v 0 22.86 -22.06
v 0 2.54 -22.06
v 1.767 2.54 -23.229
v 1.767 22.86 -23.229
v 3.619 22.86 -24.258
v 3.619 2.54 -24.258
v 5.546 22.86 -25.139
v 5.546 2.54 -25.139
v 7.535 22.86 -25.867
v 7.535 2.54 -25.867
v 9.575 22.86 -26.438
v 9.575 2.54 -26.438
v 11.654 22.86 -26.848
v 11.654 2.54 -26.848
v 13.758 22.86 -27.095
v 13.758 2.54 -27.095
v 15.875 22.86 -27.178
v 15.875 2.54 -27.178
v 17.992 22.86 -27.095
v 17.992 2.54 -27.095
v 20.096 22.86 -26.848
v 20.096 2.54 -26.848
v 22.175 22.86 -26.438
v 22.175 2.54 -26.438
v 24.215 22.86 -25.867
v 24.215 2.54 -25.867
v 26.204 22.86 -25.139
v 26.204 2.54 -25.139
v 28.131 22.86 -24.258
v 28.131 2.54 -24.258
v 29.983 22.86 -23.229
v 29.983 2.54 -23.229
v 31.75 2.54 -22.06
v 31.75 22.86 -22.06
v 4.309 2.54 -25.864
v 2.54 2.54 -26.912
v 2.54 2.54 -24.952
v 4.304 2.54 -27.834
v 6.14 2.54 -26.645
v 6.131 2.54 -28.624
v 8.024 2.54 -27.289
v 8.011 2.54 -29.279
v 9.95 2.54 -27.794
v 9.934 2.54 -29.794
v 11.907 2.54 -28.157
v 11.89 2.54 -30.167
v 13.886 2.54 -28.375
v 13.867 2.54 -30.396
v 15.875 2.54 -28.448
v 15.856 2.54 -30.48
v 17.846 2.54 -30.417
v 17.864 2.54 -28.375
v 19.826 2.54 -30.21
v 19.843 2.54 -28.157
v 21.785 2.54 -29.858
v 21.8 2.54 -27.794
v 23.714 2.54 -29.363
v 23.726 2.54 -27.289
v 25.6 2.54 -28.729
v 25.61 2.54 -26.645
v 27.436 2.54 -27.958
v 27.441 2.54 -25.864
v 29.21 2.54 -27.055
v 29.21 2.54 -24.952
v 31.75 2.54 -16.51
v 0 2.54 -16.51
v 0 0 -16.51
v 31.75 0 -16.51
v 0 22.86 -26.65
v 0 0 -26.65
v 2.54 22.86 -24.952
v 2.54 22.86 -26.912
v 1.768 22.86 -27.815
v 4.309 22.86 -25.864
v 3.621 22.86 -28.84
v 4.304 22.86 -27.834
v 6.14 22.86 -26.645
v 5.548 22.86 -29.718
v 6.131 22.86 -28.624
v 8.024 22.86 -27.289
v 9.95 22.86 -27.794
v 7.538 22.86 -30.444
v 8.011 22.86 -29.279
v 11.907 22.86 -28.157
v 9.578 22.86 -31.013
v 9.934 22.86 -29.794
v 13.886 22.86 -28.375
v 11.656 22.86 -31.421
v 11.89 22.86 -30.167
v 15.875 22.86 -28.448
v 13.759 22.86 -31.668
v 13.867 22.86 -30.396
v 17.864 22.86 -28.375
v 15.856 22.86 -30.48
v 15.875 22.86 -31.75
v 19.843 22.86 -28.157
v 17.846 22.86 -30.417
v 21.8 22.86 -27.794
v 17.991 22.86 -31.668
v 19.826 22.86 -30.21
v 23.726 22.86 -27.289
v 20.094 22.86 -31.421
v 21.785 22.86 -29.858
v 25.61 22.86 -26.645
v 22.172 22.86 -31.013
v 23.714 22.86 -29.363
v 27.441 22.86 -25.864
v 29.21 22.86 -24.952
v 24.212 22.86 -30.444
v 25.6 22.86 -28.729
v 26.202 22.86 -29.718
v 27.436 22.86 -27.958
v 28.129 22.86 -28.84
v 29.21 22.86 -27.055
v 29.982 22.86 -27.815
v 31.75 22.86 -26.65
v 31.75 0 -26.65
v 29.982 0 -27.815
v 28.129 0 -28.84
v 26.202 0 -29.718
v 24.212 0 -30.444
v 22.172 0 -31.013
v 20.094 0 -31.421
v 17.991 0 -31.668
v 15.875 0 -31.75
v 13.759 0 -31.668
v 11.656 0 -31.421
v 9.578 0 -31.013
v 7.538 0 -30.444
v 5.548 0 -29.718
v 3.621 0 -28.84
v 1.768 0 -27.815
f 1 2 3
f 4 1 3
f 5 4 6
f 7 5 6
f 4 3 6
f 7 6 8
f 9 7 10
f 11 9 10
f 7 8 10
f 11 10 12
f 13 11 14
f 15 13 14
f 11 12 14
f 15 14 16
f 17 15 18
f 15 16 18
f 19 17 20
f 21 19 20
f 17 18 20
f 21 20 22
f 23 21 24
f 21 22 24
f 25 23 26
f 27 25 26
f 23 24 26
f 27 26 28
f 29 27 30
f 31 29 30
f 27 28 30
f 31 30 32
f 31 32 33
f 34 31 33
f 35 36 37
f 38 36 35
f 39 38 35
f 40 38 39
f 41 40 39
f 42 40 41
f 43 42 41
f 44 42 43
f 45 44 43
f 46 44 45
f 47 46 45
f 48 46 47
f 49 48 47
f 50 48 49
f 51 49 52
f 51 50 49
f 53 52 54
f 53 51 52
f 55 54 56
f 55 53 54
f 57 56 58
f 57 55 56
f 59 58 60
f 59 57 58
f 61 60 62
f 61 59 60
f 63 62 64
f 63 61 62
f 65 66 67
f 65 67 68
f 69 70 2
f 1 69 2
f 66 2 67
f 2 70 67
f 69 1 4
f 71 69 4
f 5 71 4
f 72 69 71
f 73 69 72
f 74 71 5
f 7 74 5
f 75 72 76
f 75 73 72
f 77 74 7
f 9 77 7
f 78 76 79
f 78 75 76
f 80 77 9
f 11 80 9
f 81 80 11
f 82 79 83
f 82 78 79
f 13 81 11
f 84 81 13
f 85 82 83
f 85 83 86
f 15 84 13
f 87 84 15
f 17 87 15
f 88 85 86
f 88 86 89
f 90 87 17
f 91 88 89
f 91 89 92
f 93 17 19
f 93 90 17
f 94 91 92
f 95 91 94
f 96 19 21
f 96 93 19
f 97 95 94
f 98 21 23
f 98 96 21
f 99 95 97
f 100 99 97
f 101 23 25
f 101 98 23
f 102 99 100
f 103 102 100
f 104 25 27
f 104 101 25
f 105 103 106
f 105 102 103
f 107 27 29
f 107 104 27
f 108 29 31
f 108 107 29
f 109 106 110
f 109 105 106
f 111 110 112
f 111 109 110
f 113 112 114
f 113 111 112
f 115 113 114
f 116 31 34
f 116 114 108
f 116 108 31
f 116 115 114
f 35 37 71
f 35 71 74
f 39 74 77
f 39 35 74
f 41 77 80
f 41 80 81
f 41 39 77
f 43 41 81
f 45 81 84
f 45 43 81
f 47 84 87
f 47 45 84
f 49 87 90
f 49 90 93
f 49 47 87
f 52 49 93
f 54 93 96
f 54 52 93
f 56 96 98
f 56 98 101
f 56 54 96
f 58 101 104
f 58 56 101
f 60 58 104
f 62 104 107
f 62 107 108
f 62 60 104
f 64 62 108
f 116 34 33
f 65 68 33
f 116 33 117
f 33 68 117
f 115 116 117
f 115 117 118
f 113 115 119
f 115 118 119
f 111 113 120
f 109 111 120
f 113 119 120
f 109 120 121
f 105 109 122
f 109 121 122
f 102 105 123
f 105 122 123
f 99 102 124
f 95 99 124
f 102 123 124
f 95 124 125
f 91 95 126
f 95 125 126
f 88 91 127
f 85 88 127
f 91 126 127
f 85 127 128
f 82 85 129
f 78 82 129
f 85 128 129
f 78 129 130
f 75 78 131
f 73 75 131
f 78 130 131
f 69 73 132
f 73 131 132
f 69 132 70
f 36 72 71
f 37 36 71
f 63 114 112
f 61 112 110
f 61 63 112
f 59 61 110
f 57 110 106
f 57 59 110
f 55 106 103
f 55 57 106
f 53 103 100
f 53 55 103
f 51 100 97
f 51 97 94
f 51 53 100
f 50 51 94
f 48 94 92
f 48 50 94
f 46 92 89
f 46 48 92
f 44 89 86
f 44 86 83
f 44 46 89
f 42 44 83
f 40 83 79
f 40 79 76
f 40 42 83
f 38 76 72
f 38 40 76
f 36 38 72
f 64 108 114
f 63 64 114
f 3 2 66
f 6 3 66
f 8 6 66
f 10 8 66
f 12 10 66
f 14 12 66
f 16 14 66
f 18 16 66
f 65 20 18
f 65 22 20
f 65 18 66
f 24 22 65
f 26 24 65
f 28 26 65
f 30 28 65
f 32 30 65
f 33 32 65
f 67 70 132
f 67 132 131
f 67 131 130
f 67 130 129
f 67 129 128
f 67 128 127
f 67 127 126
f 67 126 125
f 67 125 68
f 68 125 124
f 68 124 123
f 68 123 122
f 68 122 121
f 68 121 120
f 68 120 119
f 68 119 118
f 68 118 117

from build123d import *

# Parameters (mm, degrees)
BOSS_EXTRUDE1_DEPTH = 2.54
BOSS_EXTRUDE4_DEPTH = 20.32
SKETCH3_W           = 31.75
SKETCH3_H           = 16.51
CUT_EXTRUDE1_DEPTH  = 2.54


with BuildPart() as part:
    # Sketch1 → Boss-Extrude1 (new body)
    with BuildSketch(Plane(origin=(0, 0, 0), x_dir=(1, 0, 0), z_dir=(0, 1, 0))):
        with BuildLine():
            Line((0, 0), (31.75, 0))
            Line((31.75, 0), (31.75, 26.649569904))
            ThreePointArc((31.75, 26.649569904), (15.875, 31.75), (0, 26.649569904))
            Line((0, 26.649569904), (0, 0))
        make_face()
    extrude(amount=BOSS_EXTRUDE1_DEPTH)

    # Sketch2 → Boss-Extrude4 (add)
    with BuildSketch(Plane(origin=(0, 2.54, 0), x_dir=(1, 0, 0), z_dir=(0, 1, 0))):
        with BuildLine():
            Line((31.75, 22.059647753), (31.75, 26.649569904))
            ThreePointArc((31.75, 26.649569904), (15.875, 31.75), (0, 26.649569904))
            Line((0, 26.649569904), (0, 22.059647753))
            ThreePointArc((0, 22.059647753), (15.875, 27.178), (31.75, 22.059647753))
        make_face()
        with BuildLine():
            Line((2.54, 26.911706478), (2.54, 24.951669261))
            ThreePointArc((2.54, 24.951669261), (15.875, 28.448), (29.21, 24.951669261))
            Line((29.21, 24.951669261), (29.21, 27.054735))
            ThreePointArc((29.21, 27.054735), (15.856249221, 30.479609179), (2.54, 26.911706478))
        make_face(mode=Mode.SUBTRACT)
    extrude(amount=BOSS_EXTRUDE4_DEPTH)

    # Sketch3 → Cut-Extrude1 (cut)
    with BuildSketch(Plane(origin=(0, 2.54, 0), x_dir=(1, 0, 0), z_dir=(0, 1, 0))):
        with Locations((15.875, 8.255)):
            Rectangle(SKETCH3_W, SKETCH3_H)
    extrude(amount=-CUT_EXTRUDE1_DEPTH, mode=Mode.SUBTRACT)


solid = part.part
